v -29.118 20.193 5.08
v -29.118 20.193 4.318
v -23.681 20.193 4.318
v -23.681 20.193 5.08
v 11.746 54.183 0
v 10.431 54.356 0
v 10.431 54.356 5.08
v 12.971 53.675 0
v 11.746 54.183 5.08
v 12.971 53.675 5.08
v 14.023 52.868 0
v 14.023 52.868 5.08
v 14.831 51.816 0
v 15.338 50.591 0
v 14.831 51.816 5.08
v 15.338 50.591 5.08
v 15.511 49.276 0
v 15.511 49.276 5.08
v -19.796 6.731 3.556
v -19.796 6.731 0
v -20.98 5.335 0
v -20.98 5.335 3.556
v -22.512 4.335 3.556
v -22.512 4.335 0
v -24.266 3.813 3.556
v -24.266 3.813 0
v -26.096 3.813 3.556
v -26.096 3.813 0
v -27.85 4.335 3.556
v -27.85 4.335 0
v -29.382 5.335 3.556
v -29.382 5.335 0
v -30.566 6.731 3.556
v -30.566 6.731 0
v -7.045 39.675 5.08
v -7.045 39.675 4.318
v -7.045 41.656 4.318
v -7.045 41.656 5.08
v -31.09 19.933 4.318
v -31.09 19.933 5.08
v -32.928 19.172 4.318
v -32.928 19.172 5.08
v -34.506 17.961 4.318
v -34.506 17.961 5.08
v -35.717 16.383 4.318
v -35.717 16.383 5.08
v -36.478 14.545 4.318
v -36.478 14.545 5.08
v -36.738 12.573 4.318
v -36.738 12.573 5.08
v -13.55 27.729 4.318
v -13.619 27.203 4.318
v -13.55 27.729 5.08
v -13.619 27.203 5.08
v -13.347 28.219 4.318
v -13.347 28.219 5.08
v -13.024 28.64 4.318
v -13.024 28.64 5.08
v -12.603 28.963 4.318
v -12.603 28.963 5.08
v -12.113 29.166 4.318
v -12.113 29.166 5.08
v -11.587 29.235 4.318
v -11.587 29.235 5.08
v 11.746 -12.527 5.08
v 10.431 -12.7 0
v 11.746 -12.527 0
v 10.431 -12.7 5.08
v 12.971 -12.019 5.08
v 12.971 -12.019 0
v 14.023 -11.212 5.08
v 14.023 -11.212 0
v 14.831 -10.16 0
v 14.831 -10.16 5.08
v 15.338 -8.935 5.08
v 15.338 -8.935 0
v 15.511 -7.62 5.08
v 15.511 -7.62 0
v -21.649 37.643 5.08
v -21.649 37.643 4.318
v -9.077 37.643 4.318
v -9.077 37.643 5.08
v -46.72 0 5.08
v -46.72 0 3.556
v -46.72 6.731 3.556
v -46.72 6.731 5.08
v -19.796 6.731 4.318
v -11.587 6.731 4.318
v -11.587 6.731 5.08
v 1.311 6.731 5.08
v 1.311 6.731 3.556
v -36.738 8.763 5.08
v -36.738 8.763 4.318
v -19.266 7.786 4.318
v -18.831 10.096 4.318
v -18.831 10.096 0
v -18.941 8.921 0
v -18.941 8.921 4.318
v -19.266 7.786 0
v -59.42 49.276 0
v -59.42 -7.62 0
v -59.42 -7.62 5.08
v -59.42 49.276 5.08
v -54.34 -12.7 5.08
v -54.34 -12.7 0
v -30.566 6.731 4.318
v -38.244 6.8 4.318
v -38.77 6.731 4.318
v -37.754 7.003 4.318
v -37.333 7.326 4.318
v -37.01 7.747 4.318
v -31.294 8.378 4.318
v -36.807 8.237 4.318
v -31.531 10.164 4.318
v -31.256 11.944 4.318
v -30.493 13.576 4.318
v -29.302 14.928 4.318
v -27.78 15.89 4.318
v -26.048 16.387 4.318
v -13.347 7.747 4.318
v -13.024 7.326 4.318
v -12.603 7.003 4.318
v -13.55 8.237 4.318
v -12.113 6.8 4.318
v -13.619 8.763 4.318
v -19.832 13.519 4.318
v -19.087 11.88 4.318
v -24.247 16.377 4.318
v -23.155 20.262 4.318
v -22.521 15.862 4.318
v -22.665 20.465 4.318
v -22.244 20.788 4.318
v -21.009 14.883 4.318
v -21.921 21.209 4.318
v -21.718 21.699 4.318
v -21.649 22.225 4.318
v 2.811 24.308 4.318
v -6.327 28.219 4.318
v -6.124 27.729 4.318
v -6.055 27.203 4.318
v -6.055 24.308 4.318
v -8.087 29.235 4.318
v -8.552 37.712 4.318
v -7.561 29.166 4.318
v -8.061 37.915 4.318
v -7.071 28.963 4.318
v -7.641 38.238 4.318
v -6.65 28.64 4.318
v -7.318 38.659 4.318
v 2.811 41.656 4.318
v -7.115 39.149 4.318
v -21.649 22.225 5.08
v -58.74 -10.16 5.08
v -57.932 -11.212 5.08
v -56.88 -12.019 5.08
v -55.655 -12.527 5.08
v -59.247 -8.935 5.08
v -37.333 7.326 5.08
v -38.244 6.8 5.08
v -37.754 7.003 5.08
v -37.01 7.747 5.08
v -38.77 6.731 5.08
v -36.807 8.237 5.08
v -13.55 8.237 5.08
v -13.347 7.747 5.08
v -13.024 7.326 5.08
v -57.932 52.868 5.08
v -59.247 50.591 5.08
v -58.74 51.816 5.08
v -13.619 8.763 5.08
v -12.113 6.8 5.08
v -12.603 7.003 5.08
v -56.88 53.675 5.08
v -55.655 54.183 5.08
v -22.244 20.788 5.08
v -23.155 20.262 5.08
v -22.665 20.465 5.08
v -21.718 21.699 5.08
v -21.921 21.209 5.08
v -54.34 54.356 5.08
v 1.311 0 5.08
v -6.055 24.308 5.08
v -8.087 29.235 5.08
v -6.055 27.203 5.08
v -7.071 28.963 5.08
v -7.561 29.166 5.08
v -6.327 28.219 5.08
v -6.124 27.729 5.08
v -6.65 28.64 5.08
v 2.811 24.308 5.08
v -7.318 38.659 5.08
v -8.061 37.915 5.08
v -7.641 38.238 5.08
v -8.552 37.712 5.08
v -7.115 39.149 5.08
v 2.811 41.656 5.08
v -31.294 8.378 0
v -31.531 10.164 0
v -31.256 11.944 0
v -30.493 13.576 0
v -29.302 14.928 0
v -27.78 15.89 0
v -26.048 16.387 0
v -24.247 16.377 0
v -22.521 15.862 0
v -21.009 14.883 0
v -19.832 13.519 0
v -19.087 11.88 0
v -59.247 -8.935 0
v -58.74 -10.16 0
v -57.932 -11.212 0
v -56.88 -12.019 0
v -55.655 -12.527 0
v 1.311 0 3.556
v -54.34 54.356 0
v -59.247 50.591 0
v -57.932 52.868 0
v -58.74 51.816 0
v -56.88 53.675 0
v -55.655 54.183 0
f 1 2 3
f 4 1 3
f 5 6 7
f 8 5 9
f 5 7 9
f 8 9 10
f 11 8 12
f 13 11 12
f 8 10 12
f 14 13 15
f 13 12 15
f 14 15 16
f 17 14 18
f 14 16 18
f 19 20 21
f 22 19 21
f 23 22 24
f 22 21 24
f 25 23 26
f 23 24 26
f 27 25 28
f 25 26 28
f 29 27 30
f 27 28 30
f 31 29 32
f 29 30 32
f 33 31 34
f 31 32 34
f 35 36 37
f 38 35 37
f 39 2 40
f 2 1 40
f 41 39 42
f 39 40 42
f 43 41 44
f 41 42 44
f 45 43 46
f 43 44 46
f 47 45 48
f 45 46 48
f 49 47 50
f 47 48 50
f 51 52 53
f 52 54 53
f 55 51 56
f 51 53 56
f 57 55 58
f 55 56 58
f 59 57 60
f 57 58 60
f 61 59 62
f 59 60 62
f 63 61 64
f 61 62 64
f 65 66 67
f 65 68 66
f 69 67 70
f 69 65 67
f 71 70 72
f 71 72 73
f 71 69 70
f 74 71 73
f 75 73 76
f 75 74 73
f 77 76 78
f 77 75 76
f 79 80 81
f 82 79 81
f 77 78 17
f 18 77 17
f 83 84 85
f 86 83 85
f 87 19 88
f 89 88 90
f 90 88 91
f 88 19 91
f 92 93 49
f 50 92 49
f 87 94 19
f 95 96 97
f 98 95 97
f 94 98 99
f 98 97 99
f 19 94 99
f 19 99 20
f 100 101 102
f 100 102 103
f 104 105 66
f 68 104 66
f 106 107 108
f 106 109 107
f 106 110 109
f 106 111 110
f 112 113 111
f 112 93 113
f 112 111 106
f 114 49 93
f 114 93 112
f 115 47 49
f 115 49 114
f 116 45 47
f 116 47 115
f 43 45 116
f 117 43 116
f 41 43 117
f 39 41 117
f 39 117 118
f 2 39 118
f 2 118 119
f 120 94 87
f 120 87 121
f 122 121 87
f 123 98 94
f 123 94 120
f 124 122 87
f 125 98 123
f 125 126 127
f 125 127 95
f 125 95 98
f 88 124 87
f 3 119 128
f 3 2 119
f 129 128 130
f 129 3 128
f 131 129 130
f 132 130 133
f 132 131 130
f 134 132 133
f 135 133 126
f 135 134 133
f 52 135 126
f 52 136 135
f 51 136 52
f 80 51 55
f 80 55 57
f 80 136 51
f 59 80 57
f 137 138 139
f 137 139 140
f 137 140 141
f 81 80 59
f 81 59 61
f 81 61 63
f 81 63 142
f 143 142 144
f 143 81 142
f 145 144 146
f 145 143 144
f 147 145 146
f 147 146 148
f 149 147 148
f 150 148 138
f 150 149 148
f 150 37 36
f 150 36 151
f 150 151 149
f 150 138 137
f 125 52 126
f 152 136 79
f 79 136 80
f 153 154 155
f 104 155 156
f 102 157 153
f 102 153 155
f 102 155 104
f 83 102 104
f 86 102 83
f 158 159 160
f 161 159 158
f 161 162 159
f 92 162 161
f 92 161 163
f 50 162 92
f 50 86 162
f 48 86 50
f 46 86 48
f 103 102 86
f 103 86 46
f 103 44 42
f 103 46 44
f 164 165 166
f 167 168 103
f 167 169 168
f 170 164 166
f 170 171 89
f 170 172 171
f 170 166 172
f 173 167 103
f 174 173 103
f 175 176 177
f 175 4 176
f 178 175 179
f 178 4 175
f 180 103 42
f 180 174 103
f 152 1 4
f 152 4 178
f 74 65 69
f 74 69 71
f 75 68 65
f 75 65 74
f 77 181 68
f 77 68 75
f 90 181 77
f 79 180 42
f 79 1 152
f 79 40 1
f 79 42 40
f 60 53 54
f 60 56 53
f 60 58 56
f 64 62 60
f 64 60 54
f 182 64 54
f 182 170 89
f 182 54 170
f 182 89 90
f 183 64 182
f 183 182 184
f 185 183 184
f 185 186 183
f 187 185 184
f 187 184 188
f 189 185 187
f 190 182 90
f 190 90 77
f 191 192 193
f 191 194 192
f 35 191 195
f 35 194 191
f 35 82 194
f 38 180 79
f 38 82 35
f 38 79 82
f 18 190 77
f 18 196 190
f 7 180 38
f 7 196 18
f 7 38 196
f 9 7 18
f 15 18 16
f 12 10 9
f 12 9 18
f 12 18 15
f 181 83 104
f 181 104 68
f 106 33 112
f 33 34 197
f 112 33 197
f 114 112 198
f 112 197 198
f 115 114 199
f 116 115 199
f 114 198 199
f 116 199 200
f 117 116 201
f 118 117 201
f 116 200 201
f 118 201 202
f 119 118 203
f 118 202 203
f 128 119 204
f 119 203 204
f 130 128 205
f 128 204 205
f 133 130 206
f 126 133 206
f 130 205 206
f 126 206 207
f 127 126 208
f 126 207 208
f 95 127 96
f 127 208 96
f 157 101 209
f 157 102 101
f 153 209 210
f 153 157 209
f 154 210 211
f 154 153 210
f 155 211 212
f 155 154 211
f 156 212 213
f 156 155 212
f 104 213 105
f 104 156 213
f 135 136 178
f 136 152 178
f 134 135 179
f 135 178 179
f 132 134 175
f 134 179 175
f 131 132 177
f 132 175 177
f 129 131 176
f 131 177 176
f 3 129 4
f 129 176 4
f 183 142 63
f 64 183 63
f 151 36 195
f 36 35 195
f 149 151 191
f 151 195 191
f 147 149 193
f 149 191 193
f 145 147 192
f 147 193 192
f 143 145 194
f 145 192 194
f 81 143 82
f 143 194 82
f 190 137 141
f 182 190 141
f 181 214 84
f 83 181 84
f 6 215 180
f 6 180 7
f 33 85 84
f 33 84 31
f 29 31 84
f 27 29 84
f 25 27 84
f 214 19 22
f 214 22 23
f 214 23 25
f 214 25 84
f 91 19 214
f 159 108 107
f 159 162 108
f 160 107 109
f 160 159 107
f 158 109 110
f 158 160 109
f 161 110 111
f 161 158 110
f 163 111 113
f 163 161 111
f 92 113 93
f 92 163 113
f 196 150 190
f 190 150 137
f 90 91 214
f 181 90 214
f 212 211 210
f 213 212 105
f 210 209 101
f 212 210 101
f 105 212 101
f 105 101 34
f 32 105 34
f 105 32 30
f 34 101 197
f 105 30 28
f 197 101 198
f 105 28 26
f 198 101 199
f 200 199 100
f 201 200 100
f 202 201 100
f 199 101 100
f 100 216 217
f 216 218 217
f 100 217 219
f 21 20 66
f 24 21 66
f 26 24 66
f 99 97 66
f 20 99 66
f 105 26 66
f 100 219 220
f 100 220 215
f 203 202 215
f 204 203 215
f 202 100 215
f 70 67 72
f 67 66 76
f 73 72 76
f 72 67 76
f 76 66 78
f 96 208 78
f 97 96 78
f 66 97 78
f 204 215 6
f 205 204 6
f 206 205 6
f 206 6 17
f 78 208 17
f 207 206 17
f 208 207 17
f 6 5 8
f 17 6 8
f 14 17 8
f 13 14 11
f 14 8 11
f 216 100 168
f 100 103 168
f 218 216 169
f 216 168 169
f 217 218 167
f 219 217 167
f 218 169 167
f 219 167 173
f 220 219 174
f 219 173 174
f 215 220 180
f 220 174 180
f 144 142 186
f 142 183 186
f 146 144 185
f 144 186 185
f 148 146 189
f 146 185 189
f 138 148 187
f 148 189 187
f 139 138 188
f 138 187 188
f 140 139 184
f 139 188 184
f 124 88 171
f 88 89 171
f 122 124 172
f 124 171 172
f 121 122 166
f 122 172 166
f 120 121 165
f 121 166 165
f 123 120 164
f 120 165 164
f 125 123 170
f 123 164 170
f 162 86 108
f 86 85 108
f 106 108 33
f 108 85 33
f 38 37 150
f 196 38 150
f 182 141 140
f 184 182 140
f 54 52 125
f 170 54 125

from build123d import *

# Parameters (mm, degrees)
F1_DEPTH = 4.318
F0_W     = 74.9314
F0_H     = 67.056
F2_DEPTH = 5.08
F3_DEPTH = 3.556
F4_R     = 2.032
F5_R     = 7.62
F6_R     = 5.08


# Not quite as in the source:
# - a feature names something its author has since deleted; it is built from what else it names


with BuildPart() as f1:
    # F0 (on Top) → F1 (new body)
    with BuildSketch(Plane.XY):
        with BuildLine():
            Line((2.8111794461, 24.3078), (2.8111794461, 41.656))
            Line((2.8111794461, 41.656), (-7.0454205539, 41.656))
            Line((-7.0454205539, 41.656), (-7.0454205539, 37.6428))
            Line((-7.0454205539, 37.6428), (-21.6488205539, 37.6428))
            Line((-21.6488205539, 37.6428), (-21.6488205539, 20.193))
            Line((-21.6488205539, 20.193), (-36.7380205539, 20.193))
            Line((-36.7380205539, 20.193), (-36.7380205539, 6.731))
            Line((-36.7380205539, 6.731), (-30.5658055774, 6.731))
            ThreePointArc((-30.5658055774, 6.731), (-26.9316083266, 16.200428444), (-18.8310205539, 10.0965))
            ThreePointArc((-18.8310205539, 10.0965), (-19.0770921098, 8.3459122272), (-19.7962355303, 6.731))
            Line((-19.7962355303, 6.731), (-13.6188205539, 6.731))
            Line((-13.6188205539, 6.731), (-13.6188205539, 29.2354))
            Line((-13.6188205539, 29.2354), (-6.0548205539, 29.2354))
            Line((-6.0548205539, 29.2354), (-6.0548205539, 24.3078))
            Line((-6.0548205539, 24.3078), (2.8111794461, 24.3078))
        make_face()
    extrude(amount=F1_DEPTH)

    # F0 (on Top) → F2 (join)
    with BuildSketch(Plane.XY):
        with Locations((-21.9545205539, 20.828)):
            Rectangle(F0_W, F0_H)
        Polygon((-7.0454205539, 41.656), (2.8111794461, 41.656), (2.8111794461, 24.3078), (-6.0548205539, 24.3078), (-6.0548205539, 29.2354), (-13.6188205539, 29.2354), (-13.6188205539, 6.731), (1.3111794461, 6.731), (1.3111794461, 0), (-46.7202205539, 0), (-46.7202205539, 6.731), (-36.7380205539, 6.731), (-36.7380205539, 20.193), (-21.6488205539, 20.193), (-21.6488205539, 37.6428), (-7.0454205539, 37.6428), align=None, mode=Mode.SUBTRACT)
    extrude(amount=F2_DEPTH)

    # F0 (on Top) → F3 (join)
    with BuildSketch(Plane.XY):
        with BuildLine():
            Line((1.3111794461, 6.731), (-13.6188205539, 6.731))
            Line((-13.6188205539, 6.731), (-19.7962355303, 6.731))
            ThreePointArc((-19.7962355303, 6.731), (-25.1810205539, 3.7465), (-30.5658055774, 6.731))
            Line((-30.5658055774, 6.731), (-36.7380205539, 6.731))
            Line((-36.7380205539, 6.731), (-46.7202205539, 6.731))
            Line((-46.7202205539, 6.731), (-46.7202205539, 0))
            Line((-46.7202205539, 0), (1.3111794461, 0))
            Line((1.3111794461, 0), (1.3111794461, 6.731))
        make_face()
    extrude(amount=F3_DEPTH)

    # F4
    f4_edges = [f1.edges().sort_by_distance(p)[0] for p in [
        (-7.045421, 37.6428, 4.699),
        (-13.618821, 29.2354, 4.699),
        (-21.648821, 20.193, 4.699),
        (-13.618821, 6.731, 4.699),
        (-36.738021, 6.731, 4.699),
        (-6.054821, 29.2354, 4.699),
    ]]
    fillet(f4_edges, radius=F4_R)

    # F5
    f5_edges = [f1.edges().sort_by_distance(p)[0] for p in [
        (-36.738021, 20.193, 4.699),
    ]]
    fillet(f5_edges, radius=F5_R)

    # F6
    f6_edges = [f1.edges().sort_by_distance(p)[0] for p in [
        (15.511179, -12.7, 2.54),
        (15.511179, 54.356, 2.54),
        (-59.420221, 54.356, 2.54),
        (-59.420221, -12.7, 2.54),
    ]]
    fillet(f6_edges, radius=F6_R)


solid = f1.part
